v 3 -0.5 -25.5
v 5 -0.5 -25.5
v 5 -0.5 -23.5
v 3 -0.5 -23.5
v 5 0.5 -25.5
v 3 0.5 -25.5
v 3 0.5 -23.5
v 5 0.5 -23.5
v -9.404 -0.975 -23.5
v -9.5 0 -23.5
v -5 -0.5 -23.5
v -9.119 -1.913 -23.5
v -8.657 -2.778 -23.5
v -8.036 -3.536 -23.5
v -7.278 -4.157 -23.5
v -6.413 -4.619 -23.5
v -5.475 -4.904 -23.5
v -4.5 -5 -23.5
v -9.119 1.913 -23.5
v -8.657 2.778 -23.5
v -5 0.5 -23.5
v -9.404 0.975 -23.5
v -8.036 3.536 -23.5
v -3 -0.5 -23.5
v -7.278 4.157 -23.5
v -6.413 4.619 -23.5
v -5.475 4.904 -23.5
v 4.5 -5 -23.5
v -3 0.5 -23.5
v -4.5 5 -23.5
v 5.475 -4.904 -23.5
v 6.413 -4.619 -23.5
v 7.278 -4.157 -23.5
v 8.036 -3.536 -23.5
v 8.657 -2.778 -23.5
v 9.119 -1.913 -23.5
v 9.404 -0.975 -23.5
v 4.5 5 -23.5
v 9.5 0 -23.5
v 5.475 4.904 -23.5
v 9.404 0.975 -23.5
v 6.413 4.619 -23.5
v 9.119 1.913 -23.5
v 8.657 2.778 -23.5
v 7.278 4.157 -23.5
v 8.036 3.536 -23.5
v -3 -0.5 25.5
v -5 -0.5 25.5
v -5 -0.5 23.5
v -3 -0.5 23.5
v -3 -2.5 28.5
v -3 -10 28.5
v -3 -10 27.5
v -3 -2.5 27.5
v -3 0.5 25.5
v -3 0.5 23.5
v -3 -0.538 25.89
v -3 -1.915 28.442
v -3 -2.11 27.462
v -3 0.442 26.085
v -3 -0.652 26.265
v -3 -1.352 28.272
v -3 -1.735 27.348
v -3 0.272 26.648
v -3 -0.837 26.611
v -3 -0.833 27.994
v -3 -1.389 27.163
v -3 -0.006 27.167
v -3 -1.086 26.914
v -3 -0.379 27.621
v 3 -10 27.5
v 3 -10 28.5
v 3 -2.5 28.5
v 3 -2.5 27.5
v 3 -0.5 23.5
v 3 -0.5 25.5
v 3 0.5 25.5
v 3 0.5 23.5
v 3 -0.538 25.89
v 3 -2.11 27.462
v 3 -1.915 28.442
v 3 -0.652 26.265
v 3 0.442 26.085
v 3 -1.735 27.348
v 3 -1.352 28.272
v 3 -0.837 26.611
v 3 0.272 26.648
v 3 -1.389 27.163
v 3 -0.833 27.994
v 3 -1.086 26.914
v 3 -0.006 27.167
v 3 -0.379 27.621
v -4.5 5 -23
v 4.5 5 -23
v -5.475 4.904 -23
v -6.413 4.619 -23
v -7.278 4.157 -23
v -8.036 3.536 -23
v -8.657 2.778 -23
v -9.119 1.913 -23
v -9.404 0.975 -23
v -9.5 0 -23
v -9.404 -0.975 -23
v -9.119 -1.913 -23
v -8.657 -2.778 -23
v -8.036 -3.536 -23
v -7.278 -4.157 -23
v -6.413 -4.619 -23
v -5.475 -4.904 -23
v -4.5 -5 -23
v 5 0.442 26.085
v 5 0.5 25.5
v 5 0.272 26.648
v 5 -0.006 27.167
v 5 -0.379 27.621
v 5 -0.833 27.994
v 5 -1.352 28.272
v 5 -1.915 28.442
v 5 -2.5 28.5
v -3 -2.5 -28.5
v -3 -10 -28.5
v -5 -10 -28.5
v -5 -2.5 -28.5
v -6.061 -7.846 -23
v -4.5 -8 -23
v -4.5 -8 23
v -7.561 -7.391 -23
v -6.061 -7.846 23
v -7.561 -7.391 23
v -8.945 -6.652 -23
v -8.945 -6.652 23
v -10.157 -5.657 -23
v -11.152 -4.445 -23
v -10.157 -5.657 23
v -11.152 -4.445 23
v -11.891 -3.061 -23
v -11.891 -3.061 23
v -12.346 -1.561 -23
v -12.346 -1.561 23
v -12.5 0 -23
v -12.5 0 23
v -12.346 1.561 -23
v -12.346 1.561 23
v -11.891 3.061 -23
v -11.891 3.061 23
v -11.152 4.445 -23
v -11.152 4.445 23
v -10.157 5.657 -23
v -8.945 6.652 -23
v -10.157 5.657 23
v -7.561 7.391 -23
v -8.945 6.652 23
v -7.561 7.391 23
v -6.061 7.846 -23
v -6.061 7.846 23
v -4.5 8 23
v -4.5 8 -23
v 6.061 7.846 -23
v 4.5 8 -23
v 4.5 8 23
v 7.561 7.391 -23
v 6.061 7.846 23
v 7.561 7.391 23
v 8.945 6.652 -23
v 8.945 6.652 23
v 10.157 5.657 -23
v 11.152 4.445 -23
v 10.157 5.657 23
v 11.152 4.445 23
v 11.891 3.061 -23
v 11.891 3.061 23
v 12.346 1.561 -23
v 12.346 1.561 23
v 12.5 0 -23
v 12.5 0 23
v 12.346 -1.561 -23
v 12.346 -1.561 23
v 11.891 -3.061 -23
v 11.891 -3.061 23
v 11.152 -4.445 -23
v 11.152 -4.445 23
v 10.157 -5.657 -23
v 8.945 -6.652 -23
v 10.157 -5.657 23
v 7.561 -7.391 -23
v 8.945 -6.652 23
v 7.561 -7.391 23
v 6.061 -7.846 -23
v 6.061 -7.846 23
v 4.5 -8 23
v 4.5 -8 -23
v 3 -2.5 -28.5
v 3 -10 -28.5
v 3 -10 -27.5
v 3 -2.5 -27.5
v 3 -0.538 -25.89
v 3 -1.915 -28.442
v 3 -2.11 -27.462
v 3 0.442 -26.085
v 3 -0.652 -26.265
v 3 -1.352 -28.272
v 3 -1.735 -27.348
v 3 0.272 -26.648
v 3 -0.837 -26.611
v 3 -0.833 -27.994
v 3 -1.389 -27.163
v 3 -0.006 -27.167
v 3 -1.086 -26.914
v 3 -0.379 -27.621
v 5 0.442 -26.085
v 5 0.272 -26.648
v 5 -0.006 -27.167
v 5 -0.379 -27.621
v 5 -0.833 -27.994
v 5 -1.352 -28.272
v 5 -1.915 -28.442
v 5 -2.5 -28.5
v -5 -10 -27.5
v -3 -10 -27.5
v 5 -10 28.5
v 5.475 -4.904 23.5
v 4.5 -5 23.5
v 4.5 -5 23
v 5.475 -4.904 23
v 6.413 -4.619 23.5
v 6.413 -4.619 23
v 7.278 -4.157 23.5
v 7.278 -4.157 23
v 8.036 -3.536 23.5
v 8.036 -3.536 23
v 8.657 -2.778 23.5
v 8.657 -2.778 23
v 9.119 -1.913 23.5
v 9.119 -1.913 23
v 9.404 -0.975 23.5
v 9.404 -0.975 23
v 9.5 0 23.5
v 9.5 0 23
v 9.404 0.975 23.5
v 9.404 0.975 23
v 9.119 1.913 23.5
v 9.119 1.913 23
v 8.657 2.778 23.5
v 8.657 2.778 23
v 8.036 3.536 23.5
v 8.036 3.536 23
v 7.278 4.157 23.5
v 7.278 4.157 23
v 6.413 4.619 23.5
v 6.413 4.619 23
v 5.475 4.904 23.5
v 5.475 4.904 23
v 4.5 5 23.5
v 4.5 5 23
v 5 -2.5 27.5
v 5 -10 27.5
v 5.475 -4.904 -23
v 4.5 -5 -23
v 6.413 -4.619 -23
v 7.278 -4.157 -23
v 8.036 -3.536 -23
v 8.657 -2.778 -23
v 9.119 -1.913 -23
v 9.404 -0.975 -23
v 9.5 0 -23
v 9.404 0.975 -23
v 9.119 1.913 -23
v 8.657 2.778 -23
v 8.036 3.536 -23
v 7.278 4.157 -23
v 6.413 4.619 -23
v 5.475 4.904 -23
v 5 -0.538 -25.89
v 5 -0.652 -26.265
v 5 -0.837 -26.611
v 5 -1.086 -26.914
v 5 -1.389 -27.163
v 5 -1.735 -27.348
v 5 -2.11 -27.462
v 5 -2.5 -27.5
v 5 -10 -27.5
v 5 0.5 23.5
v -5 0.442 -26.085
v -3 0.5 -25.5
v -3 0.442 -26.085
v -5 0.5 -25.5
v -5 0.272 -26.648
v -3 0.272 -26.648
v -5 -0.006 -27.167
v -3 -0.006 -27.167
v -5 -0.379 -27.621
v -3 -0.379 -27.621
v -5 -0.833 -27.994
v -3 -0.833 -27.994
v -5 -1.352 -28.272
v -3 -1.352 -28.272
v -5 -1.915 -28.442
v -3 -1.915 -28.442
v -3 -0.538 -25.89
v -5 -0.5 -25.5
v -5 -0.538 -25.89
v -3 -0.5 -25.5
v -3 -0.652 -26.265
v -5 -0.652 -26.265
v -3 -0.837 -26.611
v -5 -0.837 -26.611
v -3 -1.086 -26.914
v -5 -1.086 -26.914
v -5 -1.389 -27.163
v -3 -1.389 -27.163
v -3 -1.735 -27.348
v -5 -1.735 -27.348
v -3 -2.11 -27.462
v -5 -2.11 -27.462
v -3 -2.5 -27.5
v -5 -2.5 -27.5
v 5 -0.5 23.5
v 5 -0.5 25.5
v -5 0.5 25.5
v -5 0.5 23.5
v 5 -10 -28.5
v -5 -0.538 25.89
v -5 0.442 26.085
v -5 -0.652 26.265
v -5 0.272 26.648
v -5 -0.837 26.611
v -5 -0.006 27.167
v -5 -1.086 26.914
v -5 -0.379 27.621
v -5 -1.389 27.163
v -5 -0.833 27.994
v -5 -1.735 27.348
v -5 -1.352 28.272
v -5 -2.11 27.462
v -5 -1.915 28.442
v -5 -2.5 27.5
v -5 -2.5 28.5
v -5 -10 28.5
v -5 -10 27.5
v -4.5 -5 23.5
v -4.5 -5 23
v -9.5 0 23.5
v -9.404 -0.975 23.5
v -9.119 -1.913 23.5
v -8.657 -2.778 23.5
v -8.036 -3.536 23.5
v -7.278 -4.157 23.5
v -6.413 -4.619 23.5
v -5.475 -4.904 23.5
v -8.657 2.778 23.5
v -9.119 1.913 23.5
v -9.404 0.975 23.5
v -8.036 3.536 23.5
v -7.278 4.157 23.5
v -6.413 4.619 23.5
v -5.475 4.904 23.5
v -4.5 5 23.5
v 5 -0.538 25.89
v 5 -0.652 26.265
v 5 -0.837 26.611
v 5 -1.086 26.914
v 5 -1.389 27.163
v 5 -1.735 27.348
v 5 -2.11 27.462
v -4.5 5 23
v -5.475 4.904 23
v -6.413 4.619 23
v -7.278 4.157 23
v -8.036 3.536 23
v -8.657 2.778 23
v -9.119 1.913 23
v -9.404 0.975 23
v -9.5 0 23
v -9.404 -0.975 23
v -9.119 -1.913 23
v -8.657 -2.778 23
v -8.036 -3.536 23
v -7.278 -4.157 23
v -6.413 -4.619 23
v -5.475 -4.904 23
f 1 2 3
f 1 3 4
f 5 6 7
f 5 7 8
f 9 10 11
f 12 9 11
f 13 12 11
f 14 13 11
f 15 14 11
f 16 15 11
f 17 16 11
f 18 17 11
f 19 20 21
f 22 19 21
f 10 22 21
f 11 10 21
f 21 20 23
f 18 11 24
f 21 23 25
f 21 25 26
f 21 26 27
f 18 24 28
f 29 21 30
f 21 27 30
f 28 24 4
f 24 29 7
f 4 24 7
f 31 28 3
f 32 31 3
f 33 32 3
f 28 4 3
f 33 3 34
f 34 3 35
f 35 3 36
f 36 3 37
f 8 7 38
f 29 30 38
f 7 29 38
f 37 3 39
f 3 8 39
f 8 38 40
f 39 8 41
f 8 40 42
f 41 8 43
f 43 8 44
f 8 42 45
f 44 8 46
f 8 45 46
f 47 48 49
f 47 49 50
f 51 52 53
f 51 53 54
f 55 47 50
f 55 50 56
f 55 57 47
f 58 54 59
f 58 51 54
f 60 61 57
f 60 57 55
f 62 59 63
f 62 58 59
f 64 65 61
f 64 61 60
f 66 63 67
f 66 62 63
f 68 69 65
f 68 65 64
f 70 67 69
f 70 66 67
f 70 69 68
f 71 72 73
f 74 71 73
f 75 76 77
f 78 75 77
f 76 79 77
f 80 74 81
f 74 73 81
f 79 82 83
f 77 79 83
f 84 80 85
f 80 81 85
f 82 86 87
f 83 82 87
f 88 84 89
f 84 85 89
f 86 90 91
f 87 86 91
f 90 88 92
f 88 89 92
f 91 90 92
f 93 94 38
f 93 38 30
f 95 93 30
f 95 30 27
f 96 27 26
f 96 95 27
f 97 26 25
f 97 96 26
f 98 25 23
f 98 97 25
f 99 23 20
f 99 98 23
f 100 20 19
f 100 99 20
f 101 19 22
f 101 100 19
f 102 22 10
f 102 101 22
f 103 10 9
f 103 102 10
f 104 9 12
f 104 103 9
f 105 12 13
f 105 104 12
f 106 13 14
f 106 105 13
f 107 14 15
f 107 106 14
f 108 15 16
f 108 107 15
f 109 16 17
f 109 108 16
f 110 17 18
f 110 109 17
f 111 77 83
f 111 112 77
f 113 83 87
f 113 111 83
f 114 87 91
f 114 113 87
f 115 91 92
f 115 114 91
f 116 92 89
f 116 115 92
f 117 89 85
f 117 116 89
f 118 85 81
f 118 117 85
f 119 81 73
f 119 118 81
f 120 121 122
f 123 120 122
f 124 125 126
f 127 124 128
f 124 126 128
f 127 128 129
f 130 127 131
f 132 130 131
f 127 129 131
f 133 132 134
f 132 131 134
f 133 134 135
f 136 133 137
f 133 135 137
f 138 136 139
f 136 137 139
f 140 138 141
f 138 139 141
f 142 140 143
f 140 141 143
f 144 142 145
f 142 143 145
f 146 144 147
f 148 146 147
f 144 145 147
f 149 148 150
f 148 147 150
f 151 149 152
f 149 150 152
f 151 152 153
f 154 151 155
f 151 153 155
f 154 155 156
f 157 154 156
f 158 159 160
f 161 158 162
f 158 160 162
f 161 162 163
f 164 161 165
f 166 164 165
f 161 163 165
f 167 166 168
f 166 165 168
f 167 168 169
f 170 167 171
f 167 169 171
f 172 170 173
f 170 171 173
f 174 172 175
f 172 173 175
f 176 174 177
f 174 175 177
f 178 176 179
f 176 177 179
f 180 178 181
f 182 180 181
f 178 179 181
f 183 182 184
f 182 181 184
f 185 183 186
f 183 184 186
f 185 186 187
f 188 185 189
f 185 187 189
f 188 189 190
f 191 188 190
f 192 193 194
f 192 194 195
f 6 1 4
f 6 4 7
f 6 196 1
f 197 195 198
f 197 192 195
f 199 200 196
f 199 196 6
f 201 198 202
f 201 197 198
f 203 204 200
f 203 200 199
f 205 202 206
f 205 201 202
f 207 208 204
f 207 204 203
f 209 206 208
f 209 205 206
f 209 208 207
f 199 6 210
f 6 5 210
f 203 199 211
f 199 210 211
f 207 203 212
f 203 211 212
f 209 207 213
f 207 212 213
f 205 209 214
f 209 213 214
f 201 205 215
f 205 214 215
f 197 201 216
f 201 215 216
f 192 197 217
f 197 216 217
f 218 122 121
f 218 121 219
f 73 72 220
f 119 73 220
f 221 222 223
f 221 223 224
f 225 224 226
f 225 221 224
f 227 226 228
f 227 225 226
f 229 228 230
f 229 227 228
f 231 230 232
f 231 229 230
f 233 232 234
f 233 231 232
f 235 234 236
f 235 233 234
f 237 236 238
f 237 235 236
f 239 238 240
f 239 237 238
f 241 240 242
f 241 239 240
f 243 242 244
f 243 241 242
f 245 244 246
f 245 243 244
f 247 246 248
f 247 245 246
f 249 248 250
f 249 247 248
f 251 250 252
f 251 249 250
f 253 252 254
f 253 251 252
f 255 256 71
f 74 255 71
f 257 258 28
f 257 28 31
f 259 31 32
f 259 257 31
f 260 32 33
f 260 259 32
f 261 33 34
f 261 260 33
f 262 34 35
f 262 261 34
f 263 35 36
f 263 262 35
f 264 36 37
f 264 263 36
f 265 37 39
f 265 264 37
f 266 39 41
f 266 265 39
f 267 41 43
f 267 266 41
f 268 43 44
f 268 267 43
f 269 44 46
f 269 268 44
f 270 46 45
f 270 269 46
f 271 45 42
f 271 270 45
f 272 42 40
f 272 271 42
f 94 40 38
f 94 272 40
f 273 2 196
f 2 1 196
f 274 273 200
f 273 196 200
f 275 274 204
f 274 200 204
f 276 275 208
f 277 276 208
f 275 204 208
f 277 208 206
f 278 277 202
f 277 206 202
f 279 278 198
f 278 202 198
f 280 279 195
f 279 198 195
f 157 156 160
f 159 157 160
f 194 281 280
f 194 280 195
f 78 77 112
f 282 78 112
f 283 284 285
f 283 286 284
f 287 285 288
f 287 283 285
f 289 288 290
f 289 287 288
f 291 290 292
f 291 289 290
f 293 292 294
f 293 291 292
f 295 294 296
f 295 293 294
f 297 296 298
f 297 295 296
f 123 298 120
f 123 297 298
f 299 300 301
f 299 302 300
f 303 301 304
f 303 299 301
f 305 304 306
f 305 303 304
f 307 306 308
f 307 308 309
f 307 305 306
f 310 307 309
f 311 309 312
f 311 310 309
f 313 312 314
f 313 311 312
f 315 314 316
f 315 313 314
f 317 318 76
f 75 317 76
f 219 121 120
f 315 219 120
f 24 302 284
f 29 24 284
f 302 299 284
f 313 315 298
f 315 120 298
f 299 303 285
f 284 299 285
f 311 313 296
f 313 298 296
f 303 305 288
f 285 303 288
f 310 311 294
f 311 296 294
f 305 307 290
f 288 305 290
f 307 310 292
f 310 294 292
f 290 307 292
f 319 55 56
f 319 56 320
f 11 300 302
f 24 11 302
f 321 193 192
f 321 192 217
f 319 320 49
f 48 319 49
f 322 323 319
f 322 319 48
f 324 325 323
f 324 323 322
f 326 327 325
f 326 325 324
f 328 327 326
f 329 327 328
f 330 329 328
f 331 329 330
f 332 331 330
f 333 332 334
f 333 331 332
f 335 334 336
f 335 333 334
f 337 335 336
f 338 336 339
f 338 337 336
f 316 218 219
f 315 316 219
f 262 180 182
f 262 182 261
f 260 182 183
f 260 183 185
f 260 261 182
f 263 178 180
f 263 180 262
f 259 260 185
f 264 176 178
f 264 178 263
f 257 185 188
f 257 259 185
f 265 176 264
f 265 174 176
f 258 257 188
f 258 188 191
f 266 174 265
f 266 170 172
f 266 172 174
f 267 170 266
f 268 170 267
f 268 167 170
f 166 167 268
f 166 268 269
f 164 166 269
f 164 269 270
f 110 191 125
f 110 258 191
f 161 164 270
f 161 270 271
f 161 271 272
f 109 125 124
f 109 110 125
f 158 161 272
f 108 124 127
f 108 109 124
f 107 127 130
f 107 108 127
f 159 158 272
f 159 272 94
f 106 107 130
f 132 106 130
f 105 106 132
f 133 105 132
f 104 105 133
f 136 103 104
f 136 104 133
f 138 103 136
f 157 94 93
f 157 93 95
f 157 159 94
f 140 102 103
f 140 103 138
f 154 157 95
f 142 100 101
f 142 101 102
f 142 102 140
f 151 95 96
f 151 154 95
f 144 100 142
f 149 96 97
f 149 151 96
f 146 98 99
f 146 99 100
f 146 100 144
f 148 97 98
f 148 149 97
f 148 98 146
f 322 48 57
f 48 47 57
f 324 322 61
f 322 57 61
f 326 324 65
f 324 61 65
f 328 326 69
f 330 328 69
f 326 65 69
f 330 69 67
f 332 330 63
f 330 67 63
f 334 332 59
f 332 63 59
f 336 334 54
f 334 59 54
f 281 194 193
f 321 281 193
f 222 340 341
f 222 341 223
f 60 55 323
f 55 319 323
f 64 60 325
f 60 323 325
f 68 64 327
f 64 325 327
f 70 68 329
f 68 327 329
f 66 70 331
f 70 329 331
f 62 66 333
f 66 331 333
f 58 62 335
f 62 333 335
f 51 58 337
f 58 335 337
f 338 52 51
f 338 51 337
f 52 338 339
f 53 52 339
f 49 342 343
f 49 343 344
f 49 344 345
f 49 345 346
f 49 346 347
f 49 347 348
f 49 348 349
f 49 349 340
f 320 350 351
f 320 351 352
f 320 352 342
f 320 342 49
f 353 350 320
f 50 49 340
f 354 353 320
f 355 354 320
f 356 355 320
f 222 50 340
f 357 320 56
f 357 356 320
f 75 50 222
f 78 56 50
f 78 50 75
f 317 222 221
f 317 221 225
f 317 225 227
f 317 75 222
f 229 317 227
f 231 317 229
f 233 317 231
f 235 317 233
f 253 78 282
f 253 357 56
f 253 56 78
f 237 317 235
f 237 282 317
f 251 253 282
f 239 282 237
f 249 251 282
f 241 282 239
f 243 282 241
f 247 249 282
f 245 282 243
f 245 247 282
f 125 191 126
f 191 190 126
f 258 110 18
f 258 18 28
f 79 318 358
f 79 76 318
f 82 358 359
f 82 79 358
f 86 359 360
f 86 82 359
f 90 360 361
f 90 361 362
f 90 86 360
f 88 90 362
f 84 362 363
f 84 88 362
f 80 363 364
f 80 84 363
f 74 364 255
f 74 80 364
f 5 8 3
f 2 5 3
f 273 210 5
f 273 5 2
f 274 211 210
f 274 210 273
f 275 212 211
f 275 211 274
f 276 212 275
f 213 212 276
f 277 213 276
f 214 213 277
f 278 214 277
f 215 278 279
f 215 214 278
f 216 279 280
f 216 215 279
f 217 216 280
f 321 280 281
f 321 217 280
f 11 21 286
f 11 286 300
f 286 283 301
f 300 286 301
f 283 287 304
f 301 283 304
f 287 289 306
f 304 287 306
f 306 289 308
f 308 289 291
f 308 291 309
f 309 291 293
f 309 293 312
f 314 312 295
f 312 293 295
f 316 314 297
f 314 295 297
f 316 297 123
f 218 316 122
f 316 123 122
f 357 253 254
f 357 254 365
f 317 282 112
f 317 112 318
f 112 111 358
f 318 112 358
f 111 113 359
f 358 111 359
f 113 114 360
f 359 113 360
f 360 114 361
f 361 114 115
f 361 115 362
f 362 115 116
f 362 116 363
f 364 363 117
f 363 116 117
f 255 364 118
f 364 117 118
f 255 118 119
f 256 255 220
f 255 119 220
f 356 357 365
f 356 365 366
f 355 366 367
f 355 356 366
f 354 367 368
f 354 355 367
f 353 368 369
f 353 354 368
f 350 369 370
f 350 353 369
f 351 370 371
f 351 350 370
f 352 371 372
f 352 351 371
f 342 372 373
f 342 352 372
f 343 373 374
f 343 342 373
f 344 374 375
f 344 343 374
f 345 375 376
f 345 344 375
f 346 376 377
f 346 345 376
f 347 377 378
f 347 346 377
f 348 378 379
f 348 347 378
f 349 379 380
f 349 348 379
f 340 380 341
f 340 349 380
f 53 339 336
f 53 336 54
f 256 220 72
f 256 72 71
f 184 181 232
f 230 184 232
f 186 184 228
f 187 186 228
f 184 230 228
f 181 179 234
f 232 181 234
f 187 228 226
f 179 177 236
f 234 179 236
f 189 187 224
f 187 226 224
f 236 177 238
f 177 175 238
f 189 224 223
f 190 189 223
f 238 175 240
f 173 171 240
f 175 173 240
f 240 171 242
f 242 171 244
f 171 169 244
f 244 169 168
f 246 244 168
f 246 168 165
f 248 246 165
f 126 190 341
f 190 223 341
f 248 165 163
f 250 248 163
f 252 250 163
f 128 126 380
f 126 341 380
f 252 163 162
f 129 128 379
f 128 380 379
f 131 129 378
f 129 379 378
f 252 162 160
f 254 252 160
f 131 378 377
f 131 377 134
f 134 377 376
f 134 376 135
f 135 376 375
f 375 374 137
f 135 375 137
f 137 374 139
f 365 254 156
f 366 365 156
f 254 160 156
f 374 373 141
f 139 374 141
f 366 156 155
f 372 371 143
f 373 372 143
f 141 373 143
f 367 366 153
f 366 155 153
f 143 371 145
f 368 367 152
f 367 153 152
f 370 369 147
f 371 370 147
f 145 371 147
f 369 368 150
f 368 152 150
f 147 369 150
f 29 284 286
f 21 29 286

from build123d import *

# Parameters (mm, degrees)
EXTRUDE1_DEPTH          = 23
EXTRUDE2_DEPTH          = 23.5
SKETCH6_W               = 2
SKETCH6_H               = 1
MIRROR2_COPY_1_SKETCH_W = 2
MIRROR2_COPY_1_SKETCH_H = 1


with BuildPart() as part:
    # Sketch1 → Extrude1 (new, symmetric)
    with BuildSketch(Plane.XY):
        with BuildLine():
            Line((-4.5, 8), (4.5, 8))
            ThreePointArc((4.5, 8), (12.5, 0), (4.5, -8))
            Line((4.5, -8), (-4.5, -8))
            ThreePointArc((-4.5, -8), (-12.5, 0), (-4.5, 8))
        make_face()
    extrude(amount=EXTRUDE1_DEPTH, both=True)

    # Sketch2 → Extrude2 (add, symmetric)
    with BuildSketch(Plane.XY):
        with BuildLine():
            Line((-4.5, -5), (4.5, -5))
            ThreePointArc((4.5, -5), (9.5, 0), (4.5, 5))
            Line((4.5, 5), (-4.5, 5))
            ThreePointArc((-4.5, 5), (-9.5, 0), (-4.5, -5))
        make_face()
    extrude(amount=EXTRUDE2_DEPTH, both=True)

    # Sweep1: sweep along a path in Sketch3
    with BuildLine(Plane(origin=(-4, 0, 0), x_dir=(0, 0, -1), z_dir=(1, 0, 0))) as sweep1_path:
        Line((0, 0), (-25.5, 0))
        ThreePointArc((-25.5, 0), (-27.267766953, -0.732233047), (-28, -2.5))
        Line((-28, -2.5), (-28, -10))
    # Sketch6 → Sweep1 (sweep)
    with BuildSketch(Plane.XY):
        with Locations((-4, 0)):
            Rectangle(SKETCH6_W, SKETCH6_H)
    sweep1 = sweep(path=sweep1_path.line)

    # Mirror1: Sweep1 across plane
    add(sweep1.mirror(Plane(origin=(0, 0, 0), x_dir=(0, 0, 1), z_dir=(1, 0, 0))))

    # Mirror2: Sweep1 across plane
    add(sweep1.mirror(Plane.XY))

    # Mirror2 copy 1: sweep along a path in Mirror2 copy 1 path
    with BuildLine(Plane.ZY.offset(-4)) as mirror2_copy_1_path:
        Line((0, 0), (-25.5, 0))
        ThreePointArc((-25.5, 0), (-27.267766953, -0.732233047), (-28, -2.5))
        Line((-28, -2.5), (-28, -10))
    # Mirror2 copy 1 sketch → Mirror2 copy 1 (sweep)
    with BuildSketch(Plane(origin=(0, 0, 0), x_dir=(-1, 0, 0), z_dir=(0, 0, -1))):
        with Locations((-4, 0)):
            Rectangle(MIRROR2_COPY_1_SKETCH_W, MIRROR2_COPY_1_SKETCH_H)
    sweep(path=mirror2_copy_1_path.line)


solid = part.part
